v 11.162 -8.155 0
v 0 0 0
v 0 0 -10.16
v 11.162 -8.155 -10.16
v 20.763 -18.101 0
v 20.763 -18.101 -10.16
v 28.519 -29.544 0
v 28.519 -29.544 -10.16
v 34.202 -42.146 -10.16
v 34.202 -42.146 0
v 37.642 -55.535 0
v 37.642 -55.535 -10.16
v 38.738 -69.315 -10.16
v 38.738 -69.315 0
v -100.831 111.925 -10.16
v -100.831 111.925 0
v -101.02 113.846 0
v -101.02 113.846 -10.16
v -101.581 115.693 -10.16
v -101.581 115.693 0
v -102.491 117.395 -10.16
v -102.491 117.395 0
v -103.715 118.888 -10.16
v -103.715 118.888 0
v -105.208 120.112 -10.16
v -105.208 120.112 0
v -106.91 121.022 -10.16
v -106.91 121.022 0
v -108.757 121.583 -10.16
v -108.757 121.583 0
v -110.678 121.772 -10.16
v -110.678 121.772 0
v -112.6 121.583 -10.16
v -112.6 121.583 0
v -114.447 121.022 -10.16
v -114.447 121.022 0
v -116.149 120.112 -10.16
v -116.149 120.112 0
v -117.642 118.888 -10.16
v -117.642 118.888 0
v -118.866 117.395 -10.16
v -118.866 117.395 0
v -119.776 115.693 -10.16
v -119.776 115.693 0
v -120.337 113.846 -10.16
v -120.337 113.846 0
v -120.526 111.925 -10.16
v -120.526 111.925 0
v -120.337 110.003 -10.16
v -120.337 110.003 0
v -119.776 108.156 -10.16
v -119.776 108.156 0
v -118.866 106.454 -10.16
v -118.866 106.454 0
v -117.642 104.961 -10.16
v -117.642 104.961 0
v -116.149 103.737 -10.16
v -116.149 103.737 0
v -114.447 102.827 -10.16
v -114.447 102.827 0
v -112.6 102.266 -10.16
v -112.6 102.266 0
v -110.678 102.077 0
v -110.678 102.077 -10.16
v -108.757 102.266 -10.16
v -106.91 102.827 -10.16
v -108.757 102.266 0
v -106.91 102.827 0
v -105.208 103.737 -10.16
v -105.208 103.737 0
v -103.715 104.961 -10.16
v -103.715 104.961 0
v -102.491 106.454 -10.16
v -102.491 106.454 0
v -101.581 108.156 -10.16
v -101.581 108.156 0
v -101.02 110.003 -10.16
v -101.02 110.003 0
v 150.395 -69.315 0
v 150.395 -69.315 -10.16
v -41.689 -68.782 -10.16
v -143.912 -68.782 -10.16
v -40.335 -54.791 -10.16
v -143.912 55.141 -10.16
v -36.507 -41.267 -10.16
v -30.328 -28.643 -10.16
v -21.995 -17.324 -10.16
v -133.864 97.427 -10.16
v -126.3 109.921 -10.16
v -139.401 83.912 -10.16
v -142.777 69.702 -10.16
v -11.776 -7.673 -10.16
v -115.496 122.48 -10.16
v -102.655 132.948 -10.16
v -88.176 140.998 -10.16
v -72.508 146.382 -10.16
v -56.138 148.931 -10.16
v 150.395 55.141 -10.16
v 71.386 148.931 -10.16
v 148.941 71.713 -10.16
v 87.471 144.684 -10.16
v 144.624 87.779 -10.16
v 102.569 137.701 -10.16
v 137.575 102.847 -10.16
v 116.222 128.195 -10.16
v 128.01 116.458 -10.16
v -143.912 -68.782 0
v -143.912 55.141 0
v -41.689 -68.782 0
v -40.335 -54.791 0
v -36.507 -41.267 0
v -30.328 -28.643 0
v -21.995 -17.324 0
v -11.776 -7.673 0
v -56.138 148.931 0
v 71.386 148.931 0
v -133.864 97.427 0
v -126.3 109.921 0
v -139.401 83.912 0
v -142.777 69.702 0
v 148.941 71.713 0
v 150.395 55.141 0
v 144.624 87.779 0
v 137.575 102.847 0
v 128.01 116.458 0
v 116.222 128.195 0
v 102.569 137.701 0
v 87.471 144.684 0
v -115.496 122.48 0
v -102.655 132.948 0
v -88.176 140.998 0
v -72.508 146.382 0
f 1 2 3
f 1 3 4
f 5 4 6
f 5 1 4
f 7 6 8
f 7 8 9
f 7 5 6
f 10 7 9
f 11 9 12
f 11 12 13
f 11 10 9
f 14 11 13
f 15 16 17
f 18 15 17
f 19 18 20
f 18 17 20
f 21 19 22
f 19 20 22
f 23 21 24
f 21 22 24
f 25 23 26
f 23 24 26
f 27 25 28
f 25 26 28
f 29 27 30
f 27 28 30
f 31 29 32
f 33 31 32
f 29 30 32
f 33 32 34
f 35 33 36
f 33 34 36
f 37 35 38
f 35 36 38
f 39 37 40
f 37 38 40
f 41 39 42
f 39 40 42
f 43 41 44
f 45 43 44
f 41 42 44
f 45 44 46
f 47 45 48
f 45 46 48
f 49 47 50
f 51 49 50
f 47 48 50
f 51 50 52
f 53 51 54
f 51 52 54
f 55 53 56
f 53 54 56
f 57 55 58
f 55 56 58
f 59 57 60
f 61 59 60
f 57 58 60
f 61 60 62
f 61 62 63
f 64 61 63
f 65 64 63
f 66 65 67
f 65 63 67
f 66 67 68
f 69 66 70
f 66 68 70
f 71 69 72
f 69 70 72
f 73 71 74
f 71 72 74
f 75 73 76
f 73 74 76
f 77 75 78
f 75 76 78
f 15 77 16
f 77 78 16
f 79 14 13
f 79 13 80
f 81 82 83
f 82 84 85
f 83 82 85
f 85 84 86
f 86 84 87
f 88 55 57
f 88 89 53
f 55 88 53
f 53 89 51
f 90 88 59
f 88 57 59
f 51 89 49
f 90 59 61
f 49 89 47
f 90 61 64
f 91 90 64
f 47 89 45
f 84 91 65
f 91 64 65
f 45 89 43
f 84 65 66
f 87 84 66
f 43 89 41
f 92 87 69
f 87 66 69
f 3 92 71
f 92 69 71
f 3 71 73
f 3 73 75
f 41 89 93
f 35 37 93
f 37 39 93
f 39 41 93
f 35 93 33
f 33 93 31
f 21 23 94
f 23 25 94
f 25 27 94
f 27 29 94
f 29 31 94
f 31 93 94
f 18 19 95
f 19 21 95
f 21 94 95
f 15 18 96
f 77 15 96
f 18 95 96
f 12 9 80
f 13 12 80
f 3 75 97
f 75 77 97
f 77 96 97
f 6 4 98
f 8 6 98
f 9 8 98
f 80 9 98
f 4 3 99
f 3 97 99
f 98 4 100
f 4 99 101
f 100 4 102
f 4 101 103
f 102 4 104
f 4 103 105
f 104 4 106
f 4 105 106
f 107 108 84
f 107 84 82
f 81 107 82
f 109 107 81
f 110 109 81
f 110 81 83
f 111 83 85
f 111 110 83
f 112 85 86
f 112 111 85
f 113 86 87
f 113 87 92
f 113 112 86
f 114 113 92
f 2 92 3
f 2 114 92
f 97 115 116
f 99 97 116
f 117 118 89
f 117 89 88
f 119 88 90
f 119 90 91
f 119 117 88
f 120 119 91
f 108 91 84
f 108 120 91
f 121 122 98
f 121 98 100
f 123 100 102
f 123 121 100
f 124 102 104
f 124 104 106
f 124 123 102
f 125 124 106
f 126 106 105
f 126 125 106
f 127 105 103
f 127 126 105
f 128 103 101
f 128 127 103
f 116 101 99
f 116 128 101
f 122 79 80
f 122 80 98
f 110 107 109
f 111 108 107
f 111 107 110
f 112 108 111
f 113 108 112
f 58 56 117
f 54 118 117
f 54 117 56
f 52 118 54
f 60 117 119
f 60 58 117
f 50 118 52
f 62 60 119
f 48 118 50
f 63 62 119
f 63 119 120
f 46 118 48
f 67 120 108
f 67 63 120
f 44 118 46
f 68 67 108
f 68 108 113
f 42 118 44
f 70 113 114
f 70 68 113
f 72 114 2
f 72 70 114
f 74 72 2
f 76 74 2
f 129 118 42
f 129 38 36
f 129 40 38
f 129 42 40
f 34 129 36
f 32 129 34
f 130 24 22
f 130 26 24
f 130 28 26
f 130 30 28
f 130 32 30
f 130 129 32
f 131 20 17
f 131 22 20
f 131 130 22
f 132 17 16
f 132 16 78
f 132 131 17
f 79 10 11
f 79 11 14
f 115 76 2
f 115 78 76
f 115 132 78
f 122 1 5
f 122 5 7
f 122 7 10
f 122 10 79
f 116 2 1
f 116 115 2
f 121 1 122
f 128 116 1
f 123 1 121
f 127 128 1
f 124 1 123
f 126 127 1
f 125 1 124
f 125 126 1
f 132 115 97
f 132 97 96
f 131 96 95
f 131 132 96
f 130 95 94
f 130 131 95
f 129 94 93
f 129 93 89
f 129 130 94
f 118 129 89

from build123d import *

# Parameters (mm, degrees)
F0_R     = 9.847408
F0_W     = 127.524496
F0_H     = 93.789673
F1_DEPTH = 10.16


with BuildPart() as f1:
    # F0 (on Top) → F1 (new body)
    with BuildSketch(Plane.XY):
        with BuildLine():
            ThreePointArc((-126.299633, 109.920687), (-139.400604, 83.911871), (-143.911943, 55.141368))
            Line((-143.911943, 55.141368), (-56.138069, 55.141368))
            Line((-56.138069, 55.141368), (-56.138069, 148.931041))
            ThreePointArc((-56.138069, 148.931041), (-95.592892, 137.292738), (-126.299633, 109.920687))
        make_face()
        with Locations((-110.678472, 111.924551)):
            Circle(F0_R, mode=Mode.SUBTRACT)
        with BuildLine():
            Line((-56.138069, 55.141368), (-143.911943, 55.141368))
            Line((-143.911943, 55.141368), (-143.911943, -68.781622))
            Line((-143.911943, -68.781622), (-41.689414, -68.781622))
            ThreePointArc((-41.689414, -68.781622), (-30.327603, -28.643107), (0, 0))
            ThreePointArc((0, 0), (28.519495, -29.543531), (38.738407, -69.314823))
            Line((38.738407, -69.314823), (150.395036, -69.314823))
            Line((150.395036, -69.314823), (150.395036, 55.141368))
            Line((150.395036, 55.141368), (71.386427, 55.141368))
            Line((71.386427, 55.141368), (-56.138069, 55.141368))
        make_face()
        with Locations((7.624179, 102.036204)):
            Rectangle(F0_W, F0_H)
        with BuildLine():
            Line((71.386427, 148.931041), (71.386427, 55.141368))
            Line((71.386427, 55.141368), (150.395036, 55.141368))
            ThreePointArc((150.395036, 55.141368), (128.010449, 116.457889), (71.386427, 148.931041))
        make_face()
    extrude(amount=-F1_DEPTH)


solid = f1.part
